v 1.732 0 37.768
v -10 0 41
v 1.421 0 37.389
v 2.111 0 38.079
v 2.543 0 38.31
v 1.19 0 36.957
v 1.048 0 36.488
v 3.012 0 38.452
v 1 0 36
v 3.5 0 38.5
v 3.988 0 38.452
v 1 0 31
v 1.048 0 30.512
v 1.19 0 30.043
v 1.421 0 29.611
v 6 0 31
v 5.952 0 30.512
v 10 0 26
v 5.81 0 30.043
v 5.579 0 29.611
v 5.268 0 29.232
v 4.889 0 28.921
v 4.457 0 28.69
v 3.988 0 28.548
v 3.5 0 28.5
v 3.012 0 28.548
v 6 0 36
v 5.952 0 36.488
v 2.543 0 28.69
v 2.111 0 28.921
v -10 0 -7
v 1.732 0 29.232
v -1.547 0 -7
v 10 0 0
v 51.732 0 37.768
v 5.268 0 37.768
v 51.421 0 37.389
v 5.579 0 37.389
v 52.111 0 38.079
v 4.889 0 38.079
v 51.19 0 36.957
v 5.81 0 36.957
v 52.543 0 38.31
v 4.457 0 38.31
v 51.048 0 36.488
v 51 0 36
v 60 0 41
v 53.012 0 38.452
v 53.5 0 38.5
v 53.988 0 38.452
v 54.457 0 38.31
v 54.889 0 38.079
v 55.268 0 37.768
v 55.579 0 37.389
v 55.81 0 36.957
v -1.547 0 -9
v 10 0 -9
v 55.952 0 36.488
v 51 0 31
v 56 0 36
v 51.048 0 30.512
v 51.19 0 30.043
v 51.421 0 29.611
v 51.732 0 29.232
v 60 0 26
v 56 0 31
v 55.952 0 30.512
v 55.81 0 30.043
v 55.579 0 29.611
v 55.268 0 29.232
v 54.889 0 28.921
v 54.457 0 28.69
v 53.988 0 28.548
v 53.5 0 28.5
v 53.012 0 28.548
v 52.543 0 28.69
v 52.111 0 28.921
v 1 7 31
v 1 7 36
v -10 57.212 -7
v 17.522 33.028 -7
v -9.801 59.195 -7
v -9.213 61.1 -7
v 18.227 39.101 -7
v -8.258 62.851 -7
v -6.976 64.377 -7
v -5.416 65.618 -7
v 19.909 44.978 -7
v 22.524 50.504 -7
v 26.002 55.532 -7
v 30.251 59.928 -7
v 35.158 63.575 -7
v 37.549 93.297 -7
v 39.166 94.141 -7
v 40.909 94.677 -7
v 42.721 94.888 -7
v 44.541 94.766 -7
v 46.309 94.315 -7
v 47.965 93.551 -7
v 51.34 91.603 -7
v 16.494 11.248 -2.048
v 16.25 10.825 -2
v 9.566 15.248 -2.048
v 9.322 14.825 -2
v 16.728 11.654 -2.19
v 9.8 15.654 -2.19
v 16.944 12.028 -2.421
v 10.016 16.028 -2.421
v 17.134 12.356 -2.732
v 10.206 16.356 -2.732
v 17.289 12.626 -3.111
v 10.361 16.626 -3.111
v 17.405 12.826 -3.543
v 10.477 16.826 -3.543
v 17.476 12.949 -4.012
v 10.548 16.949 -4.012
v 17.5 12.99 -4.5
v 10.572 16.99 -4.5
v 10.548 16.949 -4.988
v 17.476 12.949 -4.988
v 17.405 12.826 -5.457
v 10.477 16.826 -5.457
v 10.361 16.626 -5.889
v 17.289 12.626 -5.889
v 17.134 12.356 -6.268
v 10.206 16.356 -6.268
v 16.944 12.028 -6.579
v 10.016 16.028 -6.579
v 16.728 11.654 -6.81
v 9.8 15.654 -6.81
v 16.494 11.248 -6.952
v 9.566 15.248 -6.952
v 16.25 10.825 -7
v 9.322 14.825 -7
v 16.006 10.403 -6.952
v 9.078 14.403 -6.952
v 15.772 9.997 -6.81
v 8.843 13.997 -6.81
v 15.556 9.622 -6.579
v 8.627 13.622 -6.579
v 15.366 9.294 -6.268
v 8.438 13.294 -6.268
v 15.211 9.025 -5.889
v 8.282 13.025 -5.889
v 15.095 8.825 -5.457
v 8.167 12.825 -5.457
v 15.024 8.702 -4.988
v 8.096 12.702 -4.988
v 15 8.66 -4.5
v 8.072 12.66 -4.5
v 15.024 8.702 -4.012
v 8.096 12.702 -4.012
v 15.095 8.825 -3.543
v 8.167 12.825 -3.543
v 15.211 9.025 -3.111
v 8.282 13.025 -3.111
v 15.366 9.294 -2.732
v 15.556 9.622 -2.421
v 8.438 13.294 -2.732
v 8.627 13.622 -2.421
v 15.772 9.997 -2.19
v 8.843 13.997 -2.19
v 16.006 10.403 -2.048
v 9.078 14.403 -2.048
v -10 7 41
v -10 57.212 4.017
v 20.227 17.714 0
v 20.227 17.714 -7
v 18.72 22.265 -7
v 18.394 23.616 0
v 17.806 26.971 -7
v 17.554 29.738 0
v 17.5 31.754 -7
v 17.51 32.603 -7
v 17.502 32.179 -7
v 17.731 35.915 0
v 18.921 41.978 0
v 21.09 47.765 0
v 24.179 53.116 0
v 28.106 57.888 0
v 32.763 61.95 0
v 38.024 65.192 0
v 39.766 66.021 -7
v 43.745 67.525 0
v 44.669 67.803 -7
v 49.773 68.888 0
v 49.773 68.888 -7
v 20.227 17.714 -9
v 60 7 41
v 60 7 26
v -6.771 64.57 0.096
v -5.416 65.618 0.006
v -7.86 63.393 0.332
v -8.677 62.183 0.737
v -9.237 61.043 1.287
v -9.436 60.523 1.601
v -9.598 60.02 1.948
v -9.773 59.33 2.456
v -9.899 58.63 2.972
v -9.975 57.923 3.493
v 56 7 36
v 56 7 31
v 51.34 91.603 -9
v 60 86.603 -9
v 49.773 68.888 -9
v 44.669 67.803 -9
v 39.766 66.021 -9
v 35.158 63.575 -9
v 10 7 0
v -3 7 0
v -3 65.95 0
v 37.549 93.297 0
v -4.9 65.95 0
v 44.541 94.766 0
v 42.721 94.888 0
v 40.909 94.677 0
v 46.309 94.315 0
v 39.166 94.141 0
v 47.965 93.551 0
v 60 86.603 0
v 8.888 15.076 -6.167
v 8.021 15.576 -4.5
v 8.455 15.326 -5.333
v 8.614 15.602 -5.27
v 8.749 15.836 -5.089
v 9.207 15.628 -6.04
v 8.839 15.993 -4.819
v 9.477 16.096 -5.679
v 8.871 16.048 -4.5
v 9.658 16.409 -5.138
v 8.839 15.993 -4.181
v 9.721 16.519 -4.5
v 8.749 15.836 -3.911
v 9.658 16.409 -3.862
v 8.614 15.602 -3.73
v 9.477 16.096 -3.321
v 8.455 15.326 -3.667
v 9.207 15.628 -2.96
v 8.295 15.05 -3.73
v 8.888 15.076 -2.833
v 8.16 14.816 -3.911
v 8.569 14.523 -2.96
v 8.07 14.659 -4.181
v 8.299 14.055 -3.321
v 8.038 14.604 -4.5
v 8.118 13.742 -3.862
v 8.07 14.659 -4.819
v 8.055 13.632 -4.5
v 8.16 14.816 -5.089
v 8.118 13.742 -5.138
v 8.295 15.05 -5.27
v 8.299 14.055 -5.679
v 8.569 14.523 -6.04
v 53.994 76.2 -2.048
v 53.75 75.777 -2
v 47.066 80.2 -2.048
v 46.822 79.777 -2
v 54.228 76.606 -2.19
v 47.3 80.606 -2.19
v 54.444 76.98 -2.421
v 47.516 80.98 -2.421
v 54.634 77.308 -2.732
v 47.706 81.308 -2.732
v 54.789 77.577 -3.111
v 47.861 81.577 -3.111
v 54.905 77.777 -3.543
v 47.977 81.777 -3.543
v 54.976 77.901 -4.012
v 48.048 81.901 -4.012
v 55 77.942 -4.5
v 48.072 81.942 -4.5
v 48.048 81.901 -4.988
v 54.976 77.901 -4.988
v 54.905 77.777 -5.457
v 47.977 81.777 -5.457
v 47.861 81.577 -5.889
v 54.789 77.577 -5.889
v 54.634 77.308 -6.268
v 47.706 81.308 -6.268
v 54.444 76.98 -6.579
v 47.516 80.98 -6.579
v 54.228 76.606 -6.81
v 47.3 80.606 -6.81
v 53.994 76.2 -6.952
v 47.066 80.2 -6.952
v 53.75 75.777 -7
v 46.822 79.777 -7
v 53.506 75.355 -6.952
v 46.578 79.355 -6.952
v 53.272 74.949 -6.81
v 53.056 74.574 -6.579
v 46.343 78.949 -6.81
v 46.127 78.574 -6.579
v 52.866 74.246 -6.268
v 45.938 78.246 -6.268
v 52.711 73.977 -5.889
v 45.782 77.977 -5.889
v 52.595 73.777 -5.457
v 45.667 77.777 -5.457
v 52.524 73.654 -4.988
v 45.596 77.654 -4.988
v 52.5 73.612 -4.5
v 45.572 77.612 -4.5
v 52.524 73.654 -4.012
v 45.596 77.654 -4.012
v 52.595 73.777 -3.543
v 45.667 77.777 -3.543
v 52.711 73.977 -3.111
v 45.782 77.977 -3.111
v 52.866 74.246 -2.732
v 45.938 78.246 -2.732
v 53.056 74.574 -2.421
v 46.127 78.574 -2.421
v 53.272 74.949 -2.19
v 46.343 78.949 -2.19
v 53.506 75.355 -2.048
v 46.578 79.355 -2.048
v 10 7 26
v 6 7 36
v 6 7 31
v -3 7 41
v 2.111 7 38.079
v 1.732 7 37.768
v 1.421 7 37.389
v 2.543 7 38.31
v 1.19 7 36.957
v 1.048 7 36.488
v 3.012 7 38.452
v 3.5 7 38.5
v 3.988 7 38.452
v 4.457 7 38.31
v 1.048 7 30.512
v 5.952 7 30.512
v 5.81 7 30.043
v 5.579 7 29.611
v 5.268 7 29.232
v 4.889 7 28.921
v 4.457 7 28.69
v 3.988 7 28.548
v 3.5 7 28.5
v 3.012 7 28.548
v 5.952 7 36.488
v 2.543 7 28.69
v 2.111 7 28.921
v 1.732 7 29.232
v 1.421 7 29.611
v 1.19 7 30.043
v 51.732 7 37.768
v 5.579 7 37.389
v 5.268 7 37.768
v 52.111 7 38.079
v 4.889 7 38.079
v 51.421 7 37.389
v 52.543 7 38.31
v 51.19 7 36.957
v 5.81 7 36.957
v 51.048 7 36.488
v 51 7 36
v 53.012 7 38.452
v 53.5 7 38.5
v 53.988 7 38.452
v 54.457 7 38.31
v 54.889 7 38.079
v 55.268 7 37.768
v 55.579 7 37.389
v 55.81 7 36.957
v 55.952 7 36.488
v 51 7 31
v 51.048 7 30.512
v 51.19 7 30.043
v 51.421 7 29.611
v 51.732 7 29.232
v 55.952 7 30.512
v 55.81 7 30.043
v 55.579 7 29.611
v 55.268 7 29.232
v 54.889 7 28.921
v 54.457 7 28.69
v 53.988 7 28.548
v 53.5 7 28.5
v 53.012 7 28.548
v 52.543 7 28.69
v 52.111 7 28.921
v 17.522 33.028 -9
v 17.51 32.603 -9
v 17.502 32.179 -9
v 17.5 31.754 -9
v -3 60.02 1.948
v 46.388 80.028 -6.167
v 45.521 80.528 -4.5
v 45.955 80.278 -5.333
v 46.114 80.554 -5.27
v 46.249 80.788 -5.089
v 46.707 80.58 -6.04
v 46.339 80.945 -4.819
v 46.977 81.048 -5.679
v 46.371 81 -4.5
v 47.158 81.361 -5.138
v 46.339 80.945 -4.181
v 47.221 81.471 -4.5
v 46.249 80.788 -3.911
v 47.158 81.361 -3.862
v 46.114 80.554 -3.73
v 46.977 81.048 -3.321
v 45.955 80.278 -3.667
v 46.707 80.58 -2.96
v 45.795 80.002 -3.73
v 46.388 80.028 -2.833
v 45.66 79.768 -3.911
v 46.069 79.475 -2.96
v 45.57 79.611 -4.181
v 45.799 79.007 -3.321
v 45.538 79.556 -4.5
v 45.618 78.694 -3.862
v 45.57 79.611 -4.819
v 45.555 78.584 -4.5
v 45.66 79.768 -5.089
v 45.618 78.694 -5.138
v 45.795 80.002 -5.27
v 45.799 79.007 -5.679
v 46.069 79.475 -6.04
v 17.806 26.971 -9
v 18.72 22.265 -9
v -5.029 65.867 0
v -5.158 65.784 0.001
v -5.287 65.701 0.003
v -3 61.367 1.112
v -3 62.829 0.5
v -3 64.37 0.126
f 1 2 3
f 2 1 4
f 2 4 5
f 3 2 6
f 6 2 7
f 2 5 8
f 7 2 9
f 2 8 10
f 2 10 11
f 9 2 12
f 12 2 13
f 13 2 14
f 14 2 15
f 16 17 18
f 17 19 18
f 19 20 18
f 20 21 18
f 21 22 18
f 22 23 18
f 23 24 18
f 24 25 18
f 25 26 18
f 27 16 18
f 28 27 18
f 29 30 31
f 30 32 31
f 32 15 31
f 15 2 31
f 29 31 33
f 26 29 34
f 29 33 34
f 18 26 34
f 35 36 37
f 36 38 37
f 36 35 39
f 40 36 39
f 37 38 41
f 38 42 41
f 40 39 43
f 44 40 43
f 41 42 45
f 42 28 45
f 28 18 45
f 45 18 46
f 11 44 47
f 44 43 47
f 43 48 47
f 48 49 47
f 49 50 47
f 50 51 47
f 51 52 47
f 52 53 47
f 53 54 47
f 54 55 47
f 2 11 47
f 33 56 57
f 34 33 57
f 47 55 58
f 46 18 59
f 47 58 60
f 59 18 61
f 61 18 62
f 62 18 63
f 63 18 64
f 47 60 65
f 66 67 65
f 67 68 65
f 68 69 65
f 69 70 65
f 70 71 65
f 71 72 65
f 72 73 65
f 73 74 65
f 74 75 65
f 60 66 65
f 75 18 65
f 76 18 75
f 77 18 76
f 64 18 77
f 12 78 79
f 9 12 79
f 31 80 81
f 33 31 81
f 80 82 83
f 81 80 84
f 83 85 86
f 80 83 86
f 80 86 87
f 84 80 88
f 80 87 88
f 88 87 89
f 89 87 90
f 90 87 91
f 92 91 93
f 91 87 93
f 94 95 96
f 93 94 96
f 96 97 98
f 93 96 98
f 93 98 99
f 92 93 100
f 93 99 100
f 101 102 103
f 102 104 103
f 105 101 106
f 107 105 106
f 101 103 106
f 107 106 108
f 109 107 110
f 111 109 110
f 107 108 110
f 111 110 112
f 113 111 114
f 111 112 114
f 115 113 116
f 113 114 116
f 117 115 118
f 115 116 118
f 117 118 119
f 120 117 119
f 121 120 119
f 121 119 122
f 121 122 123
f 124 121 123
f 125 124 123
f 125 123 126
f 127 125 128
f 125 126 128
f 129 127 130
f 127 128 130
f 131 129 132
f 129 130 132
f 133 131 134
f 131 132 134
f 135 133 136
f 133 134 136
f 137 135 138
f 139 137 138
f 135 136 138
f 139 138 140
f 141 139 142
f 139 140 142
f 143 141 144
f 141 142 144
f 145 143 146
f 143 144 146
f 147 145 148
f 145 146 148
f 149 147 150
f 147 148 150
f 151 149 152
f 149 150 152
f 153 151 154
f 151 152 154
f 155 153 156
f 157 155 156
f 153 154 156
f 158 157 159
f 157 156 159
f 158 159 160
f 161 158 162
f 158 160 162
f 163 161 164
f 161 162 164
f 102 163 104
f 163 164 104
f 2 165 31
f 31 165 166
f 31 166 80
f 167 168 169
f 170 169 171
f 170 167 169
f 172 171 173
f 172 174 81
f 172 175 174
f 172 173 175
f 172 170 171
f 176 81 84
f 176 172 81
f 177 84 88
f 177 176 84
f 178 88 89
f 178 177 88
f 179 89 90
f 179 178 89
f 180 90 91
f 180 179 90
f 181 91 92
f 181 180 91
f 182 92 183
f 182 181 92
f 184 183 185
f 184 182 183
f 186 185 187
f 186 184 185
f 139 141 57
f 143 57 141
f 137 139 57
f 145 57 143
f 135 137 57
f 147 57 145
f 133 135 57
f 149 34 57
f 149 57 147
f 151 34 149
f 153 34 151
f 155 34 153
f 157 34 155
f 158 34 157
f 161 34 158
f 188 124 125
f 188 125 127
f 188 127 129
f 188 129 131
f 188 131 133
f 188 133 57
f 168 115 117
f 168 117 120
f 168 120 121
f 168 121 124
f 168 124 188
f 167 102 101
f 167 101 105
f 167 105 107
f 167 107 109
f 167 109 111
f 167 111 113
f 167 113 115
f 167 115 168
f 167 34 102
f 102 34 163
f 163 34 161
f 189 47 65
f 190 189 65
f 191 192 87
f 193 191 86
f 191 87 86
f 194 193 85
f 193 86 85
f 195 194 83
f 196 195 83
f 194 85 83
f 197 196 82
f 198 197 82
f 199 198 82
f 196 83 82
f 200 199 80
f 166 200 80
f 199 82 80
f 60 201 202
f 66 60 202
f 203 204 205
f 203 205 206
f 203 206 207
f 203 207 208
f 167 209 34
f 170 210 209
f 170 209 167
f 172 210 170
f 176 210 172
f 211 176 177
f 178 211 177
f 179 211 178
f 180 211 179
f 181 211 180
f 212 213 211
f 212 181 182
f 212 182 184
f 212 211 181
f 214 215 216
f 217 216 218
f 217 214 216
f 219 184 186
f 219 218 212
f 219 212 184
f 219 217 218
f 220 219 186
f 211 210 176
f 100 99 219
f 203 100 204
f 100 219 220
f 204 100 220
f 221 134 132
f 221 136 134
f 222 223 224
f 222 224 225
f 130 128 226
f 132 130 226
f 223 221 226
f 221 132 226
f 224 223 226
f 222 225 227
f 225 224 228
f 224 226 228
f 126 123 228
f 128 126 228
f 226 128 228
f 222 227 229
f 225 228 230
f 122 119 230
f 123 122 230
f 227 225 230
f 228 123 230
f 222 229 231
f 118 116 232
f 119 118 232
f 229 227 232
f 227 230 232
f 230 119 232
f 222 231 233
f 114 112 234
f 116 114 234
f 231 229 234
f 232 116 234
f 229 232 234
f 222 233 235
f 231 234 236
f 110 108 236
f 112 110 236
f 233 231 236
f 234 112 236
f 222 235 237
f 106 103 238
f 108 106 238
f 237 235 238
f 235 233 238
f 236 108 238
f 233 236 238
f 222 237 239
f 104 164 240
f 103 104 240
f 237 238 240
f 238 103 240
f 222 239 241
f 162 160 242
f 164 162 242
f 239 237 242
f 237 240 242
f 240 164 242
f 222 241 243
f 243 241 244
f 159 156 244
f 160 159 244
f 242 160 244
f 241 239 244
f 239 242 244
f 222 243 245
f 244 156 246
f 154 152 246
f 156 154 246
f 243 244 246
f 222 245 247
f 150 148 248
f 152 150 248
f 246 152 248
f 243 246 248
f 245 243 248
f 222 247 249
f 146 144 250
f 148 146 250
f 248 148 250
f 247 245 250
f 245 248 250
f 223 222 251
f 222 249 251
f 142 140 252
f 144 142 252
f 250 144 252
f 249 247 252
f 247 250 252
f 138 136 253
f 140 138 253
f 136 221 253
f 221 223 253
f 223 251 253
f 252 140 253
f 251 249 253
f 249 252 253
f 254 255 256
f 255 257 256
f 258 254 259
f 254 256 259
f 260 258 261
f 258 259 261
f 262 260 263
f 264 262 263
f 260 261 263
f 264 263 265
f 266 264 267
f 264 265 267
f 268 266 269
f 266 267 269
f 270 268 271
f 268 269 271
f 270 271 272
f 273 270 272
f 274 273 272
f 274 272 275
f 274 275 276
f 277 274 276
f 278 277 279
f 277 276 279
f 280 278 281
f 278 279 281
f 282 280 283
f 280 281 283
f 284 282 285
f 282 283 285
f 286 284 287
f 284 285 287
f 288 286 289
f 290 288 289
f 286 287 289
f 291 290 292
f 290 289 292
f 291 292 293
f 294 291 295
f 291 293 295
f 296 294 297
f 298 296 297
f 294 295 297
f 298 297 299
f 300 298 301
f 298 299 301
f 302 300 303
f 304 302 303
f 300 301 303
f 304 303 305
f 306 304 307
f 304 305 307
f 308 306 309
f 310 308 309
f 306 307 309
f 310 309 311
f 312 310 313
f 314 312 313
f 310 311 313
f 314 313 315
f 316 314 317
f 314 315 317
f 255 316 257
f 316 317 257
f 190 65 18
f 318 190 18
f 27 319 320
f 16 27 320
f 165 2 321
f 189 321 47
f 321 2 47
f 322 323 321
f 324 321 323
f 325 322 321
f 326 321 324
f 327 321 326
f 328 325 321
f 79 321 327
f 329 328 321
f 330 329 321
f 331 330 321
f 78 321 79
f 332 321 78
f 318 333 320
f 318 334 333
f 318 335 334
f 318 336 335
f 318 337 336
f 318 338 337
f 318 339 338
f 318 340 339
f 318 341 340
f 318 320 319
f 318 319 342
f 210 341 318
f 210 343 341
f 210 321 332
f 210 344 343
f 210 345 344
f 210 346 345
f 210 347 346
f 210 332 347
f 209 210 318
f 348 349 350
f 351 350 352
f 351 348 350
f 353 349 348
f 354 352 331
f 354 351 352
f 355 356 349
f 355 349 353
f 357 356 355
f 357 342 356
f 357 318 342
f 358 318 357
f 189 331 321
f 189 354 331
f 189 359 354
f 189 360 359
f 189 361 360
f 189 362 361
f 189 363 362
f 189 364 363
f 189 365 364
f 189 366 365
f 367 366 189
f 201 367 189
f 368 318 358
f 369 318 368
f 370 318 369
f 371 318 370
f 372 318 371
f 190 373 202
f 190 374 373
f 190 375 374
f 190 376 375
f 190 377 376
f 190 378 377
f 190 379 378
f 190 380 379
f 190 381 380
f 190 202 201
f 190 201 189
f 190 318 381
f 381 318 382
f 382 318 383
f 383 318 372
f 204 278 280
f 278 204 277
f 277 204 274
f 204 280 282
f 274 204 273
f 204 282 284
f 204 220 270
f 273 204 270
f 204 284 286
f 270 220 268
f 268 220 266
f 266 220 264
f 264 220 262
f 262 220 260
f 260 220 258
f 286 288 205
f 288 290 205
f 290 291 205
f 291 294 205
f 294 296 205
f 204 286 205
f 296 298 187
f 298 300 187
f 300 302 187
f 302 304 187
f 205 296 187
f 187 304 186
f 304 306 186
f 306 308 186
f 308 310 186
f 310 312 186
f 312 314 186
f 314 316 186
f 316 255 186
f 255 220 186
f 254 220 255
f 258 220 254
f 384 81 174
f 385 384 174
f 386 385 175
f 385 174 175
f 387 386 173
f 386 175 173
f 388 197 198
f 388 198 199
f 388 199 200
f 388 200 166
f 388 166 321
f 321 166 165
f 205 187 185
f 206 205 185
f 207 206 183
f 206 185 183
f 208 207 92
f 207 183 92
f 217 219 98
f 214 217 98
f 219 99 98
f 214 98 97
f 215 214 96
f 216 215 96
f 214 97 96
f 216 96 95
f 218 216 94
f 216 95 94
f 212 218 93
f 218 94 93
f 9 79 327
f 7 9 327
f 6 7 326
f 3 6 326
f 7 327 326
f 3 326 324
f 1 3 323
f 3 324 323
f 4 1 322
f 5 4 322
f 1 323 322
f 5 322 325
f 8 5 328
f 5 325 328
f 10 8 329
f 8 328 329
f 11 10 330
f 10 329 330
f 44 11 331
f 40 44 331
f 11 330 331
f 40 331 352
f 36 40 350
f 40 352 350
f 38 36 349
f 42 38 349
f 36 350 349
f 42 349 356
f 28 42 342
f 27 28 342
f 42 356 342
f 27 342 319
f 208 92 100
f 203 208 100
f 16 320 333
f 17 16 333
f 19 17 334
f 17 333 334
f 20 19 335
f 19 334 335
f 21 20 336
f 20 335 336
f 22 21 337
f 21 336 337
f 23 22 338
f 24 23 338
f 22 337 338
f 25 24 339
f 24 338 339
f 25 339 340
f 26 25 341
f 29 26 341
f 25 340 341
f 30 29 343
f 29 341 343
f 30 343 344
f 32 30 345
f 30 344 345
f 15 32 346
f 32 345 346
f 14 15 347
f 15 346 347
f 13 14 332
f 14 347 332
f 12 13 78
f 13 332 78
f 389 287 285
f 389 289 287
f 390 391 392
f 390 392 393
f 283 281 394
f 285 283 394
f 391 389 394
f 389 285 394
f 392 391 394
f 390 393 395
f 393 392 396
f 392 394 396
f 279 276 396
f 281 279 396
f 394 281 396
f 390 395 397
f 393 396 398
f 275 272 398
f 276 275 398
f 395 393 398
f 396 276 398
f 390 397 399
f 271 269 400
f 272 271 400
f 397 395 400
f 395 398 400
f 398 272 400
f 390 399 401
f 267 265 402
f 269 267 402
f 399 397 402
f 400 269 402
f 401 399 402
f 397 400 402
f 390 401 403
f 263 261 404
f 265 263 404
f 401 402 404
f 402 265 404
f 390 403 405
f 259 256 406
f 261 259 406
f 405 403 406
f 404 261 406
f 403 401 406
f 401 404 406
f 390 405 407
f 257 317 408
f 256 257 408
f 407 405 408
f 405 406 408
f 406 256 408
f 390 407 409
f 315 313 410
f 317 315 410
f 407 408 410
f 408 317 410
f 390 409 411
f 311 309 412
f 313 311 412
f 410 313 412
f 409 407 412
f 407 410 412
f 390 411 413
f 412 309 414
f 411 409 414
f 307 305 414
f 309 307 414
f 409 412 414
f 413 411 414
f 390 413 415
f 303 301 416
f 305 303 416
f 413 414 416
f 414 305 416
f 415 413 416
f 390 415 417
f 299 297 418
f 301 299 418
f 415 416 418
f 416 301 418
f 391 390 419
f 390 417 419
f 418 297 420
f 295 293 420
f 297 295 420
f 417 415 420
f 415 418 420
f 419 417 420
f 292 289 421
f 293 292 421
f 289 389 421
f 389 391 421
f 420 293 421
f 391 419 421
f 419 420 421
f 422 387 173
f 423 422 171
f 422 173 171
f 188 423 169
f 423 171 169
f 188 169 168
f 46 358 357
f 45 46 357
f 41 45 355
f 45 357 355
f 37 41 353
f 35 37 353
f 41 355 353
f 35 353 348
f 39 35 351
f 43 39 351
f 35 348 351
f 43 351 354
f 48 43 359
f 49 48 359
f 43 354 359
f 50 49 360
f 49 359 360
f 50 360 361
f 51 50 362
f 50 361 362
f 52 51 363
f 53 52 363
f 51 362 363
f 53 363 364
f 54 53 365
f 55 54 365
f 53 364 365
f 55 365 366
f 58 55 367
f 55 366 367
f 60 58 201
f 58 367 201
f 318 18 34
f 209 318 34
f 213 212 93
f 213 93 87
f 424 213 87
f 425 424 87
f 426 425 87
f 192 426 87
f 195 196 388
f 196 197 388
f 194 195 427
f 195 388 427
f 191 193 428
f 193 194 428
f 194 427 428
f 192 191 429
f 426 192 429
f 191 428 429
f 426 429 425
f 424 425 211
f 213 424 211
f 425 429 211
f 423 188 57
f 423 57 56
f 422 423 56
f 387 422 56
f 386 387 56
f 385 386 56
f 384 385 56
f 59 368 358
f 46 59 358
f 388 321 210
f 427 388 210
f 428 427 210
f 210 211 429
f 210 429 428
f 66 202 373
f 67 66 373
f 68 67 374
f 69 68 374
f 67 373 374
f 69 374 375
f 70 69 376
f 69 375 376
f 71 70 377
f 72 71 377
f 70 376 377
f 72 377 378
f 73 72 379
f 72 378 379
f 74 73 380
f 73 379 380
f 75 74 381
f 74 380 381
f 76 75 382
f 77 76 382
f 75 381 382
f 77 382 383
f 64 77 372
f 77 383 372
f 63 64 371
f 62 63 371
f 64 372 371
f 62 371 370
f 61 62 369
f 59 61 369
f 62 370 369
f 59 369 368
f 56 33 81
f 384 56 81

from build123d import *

# Parameters (mm, degrees)
BOSS_EXTRUDE1_DEPTH             = 7
BOSS_EXTRUDE3_DEPTH             = 2
TAP_DRILL_FOR_M6X1_0_TAP1_D     = 5
TAP_DRILL_FOR_M6X1_0_TAP1_DEPTH = 8
TAP_DRILL_FOR_M6X1_0_TAP1_TIP   = 1.502151548
BOSS_EXTRUDE4_DEPTH             = 7
BOSS_EXTRUDE5_DEPTH             = 7
CUT_EXTRUDE1_DEPTH              = 116.367305777
FILLET2_R                       = 10


with BuildPart() as part:
    # Sketch1 → Boss-Extrude1 (new body)
    with BuildSketch(Plane.XY):
        with BuildLine():
            Line((49.772581584, 68.888132052), (60, 86.602540378))
            Line((60, 86.602540378), (42.679491924, 96.602540378))
            Line((42.679491924, 96.602540378), (-10, 62.664913519))
            Line((-10, 62.664913519), (-10, 0))
            Line((-10, 0), (10, 0))
            Line((10, 0), (20.227418416, 17.714408326))
            ThreePointArc((20.227418416, 17.714408326), (22.524047358, 50.504264805), (49.772581584, 68.888132052))
        make_face()
    extrude(amount=-BOSS_EXTRUDE1_DEPTH)

    # Sketch5 → Boss-Extrude3 (add)
    with BuildSketch(Plane(origin=(0, 0, -7), x_dir=(-1, 0, 0), z_dir=(0, 0, -1))):
        with BuildLine():
            Line((-51.339745962, 91.602540378), (-60, 86.602540378))
            Line((-60, 86.602540378), (-49.772581584, 68.888132052))
            ThreePointArc((-49.772581584, 68.888132052), (-42.186769591, 66.997294279), (-35.157858732, 63.574689534))
            Line((-35.157858732, 63.574689534), (-51.339745962, 91.602540378))
        make_face()
        with BuildLine():
            ThreePointArc((-17.521633192, 33.027850844), (-18.072025965, 25.229333108), (-20.227418416, 17.714408326))
            Line((-20.227418416, 17.714408326), (-10, 0))
            Line((-10, 0), (1.547005384, 0))
            Line((1.547005384, 0), (-17.521633192, 33.027850844))
        make_face()
    extrude(amount=BOSS_EXTRUDE3_DEPTH)

    # Tap Drill for M6x1.0 Tap1
    with Locations(Plane(origin=(7.5, -4.330127019, 0), x_dir=(0, 0, -1), z_dir=(0.8660254037844368, -0.5000000000000031, 0))):
        with Locations((4.5, 92.5), (4.5, 17.5)):
            Hole(TAP_DRILL_FOR_M6X1_0_TAP1_D / 2, depth=TAP_DRILL_FOR_M6X1_0_TAP1_DEPTH)
            with Locations((0, 0, -(TAP_DRILL_FOR_M6X1_0_TAP1_DEPTH + TAP_DRILL_FOR_M6X1_0_TAP1_TIP / 2))):  # 118° drill point
                Cone(0, TAP_DRILL_FOR_M6X1_0_TAP1_D / 2, TAP_DRILL_FOR_M6X1_0_TAP1_TIP, mode=Mode.SUBTRACT)

    # Sketch9 → Boss-Extrude4 (add)
    with BuildSketch(Plane(origin=(0, 0, 0), x_dir=(1, 0, 0), z_dir=(0, 1, 0))):
        Polygon((-10, 0), (-10, -41), (60, -41), (60, -26), (10, -26), (10, 0), align=None)
    extrude(amount=BOSS_EXTRUDE4_DEPTH)

    # Sketch10 → Boss-Extrude5 (add)
    with BuildSketch(Plane.ZY.offset(10)):
        Polygon((0, 62.664913519), (41, 7), (0, 7), align=None)
    extrude(amount=-BOSS_EXTRUDE5_DEPTH)

    # Sketch11 → Cut-Extrude1 (cut, through all)
    with BuildSketch(Plane(origin=(0, 7, 0), x_dir=(1, 0, 0), z_dir=(0, 1, 0))):
        with BuildLine():
            ThreePointArc((1, -36), (3.5, -38.5), (6, -36))
            Line((6, -36), (6, -31))
            ThreePointArc((6, -31), (3.5, -28.5), (1, -31))
            Line((1, -31), (1, -36))
        make_face()
        with BuildLine():
            Line((51, -31), (51, -36))
            ThreePointArc((51, -36), (53.5, -38.5), (56, -36))
            Line((56, -36), (56, -31))
            ThreePointArc((56, -31), (53.5, -28.5), (51, -31))
        make_face()
    extrude(amount=-CUT_EXTRUDE1_DEPTH, mode=Mode.SUBTRACT)

    # Fillet2
    fillet2_edges = [part.edges().sort_by_distance(p)[0] for p in [
        (-6.5, 62.664913519, 0),
    ]]
    fillet(fillet2_edges, radius=FILLET2_R)
    fillet2_2_edges = [part.edges().sort_by_distance(p)[0] for p in [
        (-10, 62.664913519, -3.222472691),
        (42.679491924, 96.602540378, -3.5),
    ]]
    fillet(fillet2_2_edges, radius=FILLET2_R)


solid = part.part
